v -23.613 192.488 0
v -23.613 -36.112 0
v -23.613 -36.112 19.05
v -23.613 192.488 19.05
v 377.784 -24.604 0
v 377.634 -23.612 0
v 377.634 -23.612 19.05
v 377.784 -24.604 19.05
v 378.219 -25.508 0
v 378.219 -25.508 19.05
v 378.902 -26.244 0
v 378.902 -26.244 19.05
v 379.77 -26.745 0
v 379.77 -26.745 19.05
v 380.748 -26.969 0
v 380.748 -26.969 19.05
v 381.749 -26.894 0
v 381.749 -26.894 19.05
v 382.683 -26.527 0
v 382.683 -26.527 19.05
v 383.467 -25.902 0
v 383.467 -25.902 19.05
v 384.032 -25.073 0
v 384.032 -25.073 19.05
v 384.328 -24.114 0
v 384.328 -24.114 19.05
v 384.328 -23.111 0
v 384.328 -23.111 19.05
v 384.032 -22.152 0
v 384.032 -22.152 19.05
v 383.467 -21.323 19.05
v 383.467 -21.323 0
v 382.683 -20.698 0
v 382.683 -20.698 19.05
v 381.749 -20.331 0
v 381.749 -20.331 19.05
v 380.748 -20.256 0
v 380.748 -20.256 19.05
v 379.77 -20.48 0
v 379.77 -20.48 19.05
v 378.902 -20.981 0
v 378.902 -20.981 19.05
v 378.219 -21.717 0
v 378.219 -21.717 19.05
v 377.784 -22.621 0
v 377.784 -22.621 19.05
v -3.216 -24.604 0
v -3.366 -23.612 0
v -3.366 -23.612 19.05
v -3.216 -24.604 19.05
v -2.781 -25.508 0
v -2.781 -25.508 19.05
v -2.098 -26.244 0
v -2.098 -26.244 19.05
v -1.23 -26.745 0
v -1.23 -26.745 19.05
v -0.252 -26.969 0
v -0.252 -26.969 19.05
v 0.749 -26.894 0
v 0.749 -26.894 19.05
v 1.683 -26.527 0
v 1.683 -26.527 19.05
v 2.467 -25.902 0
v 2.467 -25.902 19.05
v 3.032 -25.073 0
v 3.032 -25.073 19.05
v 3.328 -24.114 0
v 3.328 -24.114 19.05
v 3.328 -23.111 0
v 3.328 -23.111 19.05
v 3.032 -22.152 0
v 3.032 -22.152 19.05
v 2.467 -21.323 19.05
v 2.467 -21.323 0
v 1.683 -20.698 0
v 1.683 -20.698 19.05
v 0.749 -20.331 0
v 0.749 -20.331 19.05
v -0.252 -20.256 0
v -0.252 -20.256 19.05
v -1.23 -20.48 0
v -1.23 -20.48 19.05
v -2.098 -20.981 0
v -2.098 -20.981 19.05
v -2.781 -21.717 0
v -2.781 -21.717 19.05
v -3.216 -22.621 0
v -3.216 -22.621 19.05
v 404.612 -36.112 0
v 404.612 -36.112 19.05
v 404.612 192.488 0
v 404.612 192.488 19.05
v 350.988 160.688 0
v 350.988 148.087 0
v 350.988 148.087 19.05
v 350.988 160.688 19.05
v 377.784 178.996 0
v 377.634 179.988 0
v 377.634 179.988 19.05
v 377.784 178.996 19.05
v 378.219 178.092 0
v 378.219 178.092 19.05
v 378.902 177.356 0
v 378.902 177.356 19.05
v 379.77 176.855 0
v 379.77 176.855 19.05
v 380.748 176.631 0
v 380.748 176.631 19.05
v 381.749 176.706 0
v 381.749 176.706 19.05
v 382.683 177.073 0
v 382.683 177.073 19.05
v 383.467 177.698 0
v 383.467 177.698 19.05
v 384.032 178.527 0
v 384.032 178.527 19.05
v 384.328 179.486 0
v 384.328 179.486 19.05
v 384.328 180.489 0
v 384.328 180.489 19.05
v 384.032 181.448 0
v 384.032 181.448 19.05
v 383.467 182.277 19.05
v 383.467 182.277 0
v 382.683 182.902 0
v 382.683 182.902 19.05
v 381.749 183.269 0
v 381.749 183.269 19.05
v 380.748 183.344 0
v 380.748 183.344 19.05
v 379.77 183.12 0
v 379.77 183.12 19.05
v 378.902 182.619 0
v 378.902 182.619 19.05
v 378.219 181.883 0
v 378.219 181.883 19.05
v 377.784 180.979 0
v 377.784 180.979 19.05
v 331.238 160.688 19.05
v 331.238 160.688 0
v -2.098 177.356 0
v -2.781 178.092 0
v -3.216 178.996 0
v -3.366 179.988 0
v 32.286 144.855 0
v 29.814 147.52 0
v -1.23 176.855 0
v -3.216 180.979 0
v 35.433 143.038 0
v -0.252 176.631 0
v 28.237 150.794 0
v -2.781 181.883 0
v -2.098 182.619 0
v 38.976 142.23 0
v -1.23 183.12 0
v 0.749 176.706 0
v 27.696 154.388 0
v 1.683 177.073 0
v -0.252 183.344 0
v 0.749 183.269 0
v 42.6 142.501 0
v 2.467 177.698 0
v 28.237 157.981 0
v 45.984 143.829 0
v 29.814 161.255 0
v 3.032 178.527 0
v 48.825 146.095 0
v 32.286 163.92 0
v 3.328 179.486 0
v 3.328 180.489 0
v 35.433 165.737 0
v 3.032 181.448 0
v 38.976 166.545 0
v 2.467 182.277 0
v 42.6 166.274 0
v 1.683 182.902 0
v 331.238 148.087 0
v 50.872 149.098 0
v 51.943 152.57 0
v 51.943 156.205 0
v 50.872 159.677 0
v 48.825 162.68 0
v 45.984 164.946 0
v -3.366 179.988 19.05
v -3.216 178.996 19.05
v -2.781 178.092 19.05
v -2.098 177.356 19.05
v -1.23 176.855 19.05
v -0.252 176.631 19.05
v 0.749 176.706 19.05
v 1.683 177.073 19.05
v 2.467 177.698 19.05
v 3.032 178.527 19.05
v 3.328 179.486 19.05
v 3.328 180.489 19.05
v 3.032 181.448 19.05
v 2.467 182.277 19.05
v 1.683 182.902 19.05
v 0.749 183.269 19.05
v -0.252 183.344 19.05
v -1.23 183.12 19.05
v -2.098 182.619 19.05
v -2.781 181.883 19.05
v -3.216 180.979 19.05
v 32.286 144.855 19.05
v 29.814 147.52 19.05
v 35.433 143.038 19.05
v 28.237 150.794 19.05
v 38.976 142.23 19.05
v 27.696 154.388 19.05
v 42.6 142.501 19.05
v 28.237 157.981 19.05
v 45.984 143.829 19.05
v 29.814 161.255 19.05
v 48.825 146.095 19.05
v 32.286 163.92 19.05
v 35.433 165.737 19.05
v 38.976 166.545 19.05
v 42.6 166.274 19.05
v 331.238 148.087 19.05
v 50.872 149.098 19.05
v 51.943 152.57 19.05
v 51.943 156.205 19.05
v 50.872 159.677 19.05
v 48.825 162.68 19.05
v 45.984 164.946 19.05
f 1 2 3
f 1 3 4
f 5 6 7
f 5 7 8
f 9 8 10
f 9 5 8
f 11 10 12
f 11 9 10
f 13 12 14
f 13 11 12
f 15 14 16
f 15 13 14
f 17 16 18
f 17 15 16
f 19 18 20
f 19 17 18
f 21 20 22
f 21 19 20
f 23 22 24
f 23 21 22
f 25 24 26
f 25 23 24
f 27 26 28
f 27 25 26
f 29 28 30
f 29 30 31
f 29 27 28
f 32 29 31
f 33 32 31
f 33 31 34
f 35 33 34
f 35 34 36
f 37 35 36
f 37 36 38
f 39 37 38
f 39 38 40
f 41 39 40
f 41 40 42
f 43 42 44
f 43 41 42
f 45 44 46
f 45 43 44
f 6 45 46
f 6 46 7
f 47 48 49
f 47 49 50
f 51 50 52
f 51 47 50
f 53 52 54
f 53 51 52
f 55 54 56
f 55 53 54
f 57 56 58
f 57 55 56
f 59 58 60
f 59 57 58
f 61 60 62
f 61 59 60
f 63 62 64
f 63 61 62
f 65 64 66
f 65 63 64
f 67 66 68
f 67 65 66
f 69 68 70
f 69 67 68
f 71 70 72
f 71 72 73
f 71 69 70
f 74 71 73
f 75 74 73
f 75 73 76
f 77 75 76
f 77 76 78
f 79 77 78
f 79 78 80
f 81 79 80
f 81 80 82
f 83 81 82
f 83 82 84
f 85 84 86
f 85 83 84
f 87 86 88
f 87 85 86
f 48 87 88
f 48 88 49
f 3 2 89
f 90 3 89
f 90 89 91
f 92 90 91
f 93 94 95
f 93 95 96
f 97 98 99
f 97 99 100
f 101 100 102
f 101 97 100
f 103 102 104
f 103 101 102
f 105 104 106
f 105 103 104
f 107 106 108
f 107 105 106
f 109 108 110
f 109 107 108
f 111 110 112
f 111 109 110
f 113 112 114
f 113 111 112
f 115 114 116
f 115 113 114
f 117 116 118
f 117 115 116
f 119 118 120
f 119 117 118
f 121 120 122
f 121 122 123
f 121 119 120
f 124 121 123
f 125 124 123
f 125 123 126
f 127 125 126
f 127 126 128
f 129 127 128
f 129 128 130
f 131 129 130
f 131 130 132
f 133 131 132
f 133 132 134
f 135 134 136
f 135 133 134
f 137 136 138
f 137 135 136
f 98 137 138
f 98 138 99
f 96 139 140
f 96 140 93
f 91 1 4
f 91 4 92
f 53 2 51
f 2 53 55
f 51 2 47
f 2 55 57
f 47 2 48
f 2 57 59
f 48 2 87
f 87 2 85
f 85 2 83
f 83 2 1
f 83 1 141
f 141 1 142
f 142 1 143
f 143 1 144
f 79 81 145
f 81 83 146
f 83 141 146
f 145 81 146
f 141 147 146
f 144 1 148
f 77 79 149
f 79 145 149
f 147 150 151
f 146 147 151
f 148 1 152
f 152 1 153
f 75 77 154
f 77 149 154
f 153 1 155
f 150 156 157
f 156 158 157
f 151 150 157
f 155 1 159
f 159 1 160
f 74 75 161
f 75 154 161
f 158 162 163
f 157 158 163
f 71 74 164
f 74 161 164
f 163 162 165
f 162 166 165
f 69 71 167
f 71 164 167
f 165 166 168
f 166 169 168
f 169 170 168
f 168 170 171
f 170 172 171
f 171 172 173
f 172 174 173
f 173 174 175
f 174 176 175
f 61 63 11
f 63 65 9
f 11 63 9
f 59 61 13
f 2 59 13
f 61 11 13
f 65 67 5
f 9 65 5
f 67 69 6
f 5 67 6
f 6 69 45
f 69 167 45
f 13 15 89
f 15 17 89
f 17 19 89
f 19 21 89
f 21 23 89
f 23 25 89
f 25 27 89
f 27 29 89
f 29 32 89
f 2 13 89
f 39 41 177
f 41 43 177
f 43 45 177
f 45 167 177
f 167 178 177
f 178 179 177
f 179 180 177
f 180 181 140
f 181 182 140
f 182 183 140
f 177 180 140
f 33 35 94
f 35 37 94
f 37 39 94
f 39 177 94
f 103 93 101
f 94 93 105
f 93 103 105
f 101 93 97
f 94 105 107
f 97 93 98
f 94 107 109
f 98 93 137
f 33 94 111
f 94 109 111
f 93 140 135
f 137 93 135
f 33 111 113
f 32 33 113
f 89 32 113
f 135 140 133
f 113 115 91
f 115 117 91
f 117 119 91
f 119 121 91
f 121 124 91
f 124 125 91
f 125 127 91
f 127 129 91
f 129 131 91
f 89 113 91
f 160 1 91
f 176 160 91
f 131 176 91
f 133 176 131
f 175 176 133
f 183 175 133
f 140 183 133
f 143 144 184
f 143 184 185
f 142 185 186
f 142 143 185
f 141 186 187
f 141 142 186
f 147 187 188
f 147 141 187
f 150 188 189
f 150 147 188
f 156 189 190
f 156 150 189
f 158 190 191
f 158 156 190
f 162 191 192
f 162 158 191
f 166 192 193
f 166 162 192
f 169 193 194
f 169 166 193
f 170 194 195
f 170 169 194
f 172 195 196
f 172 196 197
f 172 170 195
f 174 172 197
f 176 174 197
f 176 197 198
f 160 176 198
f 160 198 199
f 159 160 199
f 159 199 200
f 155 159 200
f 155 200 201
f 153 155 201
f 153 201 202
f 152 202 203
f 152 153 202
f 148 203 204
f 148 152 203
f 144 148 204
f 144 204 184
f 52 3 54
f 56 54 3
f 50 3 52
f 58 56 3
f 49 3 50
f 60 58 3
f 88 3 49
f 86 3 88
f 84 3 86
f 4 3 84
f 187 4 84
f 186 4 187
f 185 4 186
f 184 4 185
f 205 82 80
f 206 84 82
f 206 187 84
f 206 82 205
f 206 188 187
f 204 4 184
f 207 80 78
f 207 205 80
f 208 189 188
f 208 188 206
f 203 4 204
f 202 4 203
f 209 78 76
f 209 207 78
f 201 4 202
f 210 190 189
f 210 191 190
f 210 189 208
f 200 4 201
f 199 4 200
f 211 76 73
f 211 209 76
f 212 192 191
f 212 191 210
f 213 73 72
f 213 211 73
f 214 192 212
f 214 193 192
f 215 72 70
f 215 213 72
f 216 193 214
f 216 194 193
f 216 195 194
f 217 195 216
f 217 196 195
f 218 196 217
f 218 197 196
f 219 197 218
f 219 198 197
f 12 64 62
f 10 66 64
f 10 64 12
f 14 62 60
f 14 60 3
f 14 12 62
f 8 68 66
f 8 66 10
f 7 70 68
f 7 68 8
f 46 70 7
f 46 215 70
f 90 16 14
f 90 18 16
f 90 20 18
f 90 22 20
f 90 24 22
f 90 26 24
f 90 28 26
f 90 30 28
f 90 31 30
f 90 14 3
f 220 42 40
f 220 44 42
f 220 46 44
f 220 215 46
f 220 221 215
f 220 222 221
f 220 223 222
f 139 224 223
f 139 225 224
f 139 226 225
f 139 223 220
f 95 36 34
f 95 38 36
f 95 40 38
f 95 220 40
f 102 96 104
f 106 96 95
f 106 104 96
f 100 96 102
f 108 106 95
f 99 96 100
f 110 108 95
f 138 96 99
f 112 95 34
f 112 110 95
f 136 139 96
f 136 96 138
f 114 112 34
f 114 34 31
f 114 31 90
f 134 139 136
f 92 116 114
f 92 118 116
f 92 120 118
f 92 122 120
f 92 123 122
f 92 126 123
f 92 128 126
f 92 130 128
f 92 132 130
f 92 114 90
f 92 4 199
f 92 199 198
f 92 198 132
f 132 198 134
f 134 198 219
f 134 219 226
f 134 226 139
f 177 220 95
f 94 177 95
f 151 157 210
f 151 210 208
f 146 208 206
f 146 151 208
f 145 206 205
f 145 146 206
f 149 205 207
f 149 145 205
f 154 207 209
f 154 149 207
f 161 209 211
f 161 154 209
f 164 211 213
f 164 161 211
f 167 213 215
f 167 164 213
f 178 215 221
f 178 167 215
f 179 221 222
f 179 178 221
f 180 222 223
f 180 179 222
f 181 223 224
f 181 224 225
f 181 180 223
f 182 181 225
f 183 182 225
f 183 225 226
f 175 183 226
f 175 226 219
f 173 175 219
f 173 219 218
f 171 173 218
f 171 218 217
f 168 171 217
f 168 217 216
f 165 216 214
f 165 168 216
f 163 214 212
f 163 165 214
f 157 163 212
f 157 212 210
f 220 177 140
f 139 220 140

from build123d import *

# Parameters (mm, degrees)
SKETCH1_W           = 428.225
SKETCH1_H           = 228.6
SKETCH1_R           = 3.3655
SKETCH1_R_2         = 12.192
BOSS_EXTRUDE1_DEPTH = 19.05
SKETCH2_W           = 19.75
SKETCH2_H           = 12.6
CUT_EXTRUDE1_DEPTH  = 449.470305943


with BuildPart() as part:
    # Sketch1 → Boss-Extrude1 (new body)
    with BuildSketch(Plane.XY):
        with Locations((190.5, 78.1875)):
            Rectangle(SKETCH1_W, SKETCH1_H)
        with Locations(Location((0, -23.6125, 0), (0, 0, 180))):
            Circle(SKETCH1_R, mode=Mode.SUBTRACT)
        with Locations(Location((381, -23.6125, 0), (0, 0, 180))):
            Circle(SKETCH1_R, mode=Mode.SUBTRACT)
        with Locations(Location((381, 179.9875, 0), (0, 0, 180))):
            Circle(SKETCH1_R, mode=Mode.SUBTRACT)
        with Locations(Location((0, 179.9875, 0), (0, 0, 180))):
            Circle(SKETCH1_R, mode=Mode.SUBTRACT)
        with Locations(Location((39.8875, 154.3875, 0), (0, 0, 180))):
            Circle(SKETCH1_R_2, mode=Mode.SUBTRACT)
    extrude(amount=BOSS_EXTRUDE1_DEPTH)

    # Sketch2 → Cut-Extrude1 (cut, through all)
    with BuildSketch(Plane.XY.offset(19.05)):
        with Locations((341.1125, 154.3875)):
            Rectangle(SKETCH2_W, SKETCH2_H)
    extrude(amount=-CUT_EXTRUDE1_DEPTH, mode=Mode.SUBTRACT)


solid = part.part
